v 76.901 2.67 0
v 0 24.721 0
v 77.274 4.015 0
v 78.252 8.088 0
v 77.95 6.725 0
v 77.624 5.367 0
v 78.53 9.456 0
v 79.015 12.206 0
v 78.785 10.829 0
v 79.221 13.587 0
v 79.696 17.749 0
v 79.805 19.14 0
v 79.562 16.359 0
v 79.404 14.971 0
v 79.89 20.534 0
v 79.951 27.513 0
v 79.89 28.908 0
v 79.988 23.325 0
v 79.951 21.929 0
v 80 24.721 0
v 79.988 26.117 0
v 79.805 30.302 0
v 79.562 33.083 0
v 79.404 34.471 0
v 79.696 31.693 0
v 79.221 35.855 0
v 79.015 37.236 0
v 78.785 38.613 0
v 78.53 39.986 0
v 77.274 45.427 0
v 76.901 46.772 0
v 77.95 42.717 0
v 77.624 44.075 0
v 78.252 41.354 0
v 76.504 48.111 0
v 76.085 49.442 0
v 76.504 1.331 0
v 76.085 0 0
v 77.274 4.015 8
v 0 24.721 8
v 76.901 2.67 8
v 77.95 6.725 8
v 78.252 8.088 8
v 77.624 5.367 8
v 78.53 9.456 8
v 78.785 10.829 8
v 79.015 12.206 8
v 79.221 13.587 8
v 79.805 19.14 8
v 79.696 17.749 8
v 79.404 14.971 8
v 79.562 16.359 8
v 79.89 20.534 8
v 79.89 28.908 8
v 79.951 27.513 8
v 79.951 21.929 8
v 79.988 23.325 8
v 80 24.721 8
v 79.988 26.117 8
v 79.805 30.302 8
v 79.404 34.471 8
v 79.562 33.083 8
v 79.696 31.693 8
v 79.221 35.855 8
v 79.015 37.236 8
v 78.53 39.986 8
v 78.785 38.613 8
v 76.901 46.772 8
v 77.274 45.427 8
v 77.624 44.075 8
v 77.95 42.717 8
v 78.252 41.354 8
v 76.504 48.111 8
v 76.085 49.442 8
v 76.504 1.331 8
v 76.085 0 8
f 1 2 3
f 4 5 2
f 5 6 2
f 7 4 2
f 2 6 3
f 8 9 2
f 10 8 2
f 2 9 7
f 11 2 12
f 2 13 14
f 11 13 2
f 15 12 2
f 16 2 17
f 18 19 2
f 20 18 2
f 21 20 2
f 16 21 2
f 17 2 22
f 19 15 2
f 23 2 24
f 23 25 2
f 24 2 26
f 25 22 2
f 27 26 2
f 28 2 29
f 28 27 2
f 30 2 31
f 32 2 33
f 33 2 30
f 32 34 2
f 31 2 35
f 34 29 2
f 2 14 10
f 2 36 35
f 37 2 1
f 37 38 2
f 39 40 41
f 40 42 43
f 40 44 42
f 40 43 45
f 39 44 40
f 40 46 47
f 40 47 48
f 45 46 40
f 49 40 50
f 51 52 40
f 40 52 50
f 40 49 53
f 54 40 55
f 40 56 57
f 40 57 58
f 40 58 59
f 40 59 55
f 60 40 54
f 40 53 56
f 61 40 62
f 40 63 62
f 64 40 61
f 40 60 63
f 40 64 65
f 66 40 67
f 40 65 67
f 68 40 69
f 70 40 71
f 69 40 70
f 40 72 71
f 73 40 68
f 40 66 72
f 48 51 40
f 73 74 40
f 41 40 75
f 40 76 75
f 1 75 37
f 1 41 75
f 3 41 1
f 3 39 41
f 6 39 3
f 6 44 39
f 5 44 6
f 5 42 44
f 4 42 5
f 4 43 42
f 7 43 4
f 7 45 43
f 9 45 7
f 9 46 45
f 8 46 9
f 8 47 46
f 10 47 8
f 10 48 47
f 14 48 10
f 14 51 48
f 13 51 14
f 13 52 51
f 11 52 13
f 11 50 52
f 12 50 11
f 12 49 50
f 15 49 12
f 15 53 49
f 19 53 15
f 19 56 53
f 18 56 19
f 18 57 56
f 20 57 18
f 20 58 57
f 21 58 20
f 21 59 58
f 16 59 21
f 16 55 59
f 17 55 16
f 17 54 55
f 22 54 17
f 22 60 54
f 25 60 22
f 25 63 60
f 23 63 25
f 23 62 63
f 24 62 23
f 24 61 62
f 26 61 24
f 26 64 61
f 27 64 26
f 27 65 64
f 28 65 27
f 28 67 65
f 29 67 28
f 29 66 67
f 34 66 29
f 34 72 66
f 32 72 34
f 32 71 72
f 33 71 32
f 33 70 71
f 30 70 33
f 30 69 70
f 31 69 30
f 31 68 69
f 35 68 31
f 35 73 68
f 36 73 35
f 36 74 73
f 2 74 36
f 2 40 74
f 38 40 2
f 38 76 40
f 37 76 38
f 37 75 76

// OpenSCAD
$fn = 32;

// ----------------------------------------------------------------------
// Arc profile plate: sector, 38 points
// ----------------------------------------------------------------------

// --- parameters (mm) ---
sector_angle = 36;        // sector angle, degrees
sector_r = 80;            // outer radius
arc_step = 1;             // sampling step of the arc, degrees
plate_t = 8;              // plate thickness, Z
fit_tol = 0.05;           // declared fit tolerance (prompt contract)
free_tol = 0.2;           // declared free tolerance (prompt contract)

bbox_x = 2 * sector_r * sin(sector_angle / 2);  // chord of the sector
bbox_y = sector_r;  // depth of the sector (apex to arc)

profile = [[76.085, 0], [76.504, 1.331], [76.901, 2.67], [77.274, 4.015], [77.624, 5.367], [77.95, 6.725], [78.252, 8.088], [78.53, 9.456], [78.785, 10.829], [79.015, 12.206], [79.221, 13.587], [79.404, 14.971], [79.562, 16.359], [79.696, 17.749], [79.805, 19.14], [79.89, 20.534], [79.951, 21.929], [79.988, 23.325], [80, 24.721], [79.988, 26.117], [79.951, 27.513], [79.89, 28.908], [79.805, 30.302], [79.696, 31.693], [79.562, 33.083], [79.404, 34.471], [79.221, 35.855], [79.015, 37.236], [78.785, 38.613], [78.53, 39.986], [78.252, 41.354], [77.95, 42.717], [77.624, 44.075], [77.274, 45.427], [76.901, 46.772], [76.504, 48.111], [76.085, 49.442], [0, 24.721]];  // primary outline, 38 points, counter clockwise

// --- the one profile operation ---
linear_extrude(height = plate_t) polygon(points = profile);
